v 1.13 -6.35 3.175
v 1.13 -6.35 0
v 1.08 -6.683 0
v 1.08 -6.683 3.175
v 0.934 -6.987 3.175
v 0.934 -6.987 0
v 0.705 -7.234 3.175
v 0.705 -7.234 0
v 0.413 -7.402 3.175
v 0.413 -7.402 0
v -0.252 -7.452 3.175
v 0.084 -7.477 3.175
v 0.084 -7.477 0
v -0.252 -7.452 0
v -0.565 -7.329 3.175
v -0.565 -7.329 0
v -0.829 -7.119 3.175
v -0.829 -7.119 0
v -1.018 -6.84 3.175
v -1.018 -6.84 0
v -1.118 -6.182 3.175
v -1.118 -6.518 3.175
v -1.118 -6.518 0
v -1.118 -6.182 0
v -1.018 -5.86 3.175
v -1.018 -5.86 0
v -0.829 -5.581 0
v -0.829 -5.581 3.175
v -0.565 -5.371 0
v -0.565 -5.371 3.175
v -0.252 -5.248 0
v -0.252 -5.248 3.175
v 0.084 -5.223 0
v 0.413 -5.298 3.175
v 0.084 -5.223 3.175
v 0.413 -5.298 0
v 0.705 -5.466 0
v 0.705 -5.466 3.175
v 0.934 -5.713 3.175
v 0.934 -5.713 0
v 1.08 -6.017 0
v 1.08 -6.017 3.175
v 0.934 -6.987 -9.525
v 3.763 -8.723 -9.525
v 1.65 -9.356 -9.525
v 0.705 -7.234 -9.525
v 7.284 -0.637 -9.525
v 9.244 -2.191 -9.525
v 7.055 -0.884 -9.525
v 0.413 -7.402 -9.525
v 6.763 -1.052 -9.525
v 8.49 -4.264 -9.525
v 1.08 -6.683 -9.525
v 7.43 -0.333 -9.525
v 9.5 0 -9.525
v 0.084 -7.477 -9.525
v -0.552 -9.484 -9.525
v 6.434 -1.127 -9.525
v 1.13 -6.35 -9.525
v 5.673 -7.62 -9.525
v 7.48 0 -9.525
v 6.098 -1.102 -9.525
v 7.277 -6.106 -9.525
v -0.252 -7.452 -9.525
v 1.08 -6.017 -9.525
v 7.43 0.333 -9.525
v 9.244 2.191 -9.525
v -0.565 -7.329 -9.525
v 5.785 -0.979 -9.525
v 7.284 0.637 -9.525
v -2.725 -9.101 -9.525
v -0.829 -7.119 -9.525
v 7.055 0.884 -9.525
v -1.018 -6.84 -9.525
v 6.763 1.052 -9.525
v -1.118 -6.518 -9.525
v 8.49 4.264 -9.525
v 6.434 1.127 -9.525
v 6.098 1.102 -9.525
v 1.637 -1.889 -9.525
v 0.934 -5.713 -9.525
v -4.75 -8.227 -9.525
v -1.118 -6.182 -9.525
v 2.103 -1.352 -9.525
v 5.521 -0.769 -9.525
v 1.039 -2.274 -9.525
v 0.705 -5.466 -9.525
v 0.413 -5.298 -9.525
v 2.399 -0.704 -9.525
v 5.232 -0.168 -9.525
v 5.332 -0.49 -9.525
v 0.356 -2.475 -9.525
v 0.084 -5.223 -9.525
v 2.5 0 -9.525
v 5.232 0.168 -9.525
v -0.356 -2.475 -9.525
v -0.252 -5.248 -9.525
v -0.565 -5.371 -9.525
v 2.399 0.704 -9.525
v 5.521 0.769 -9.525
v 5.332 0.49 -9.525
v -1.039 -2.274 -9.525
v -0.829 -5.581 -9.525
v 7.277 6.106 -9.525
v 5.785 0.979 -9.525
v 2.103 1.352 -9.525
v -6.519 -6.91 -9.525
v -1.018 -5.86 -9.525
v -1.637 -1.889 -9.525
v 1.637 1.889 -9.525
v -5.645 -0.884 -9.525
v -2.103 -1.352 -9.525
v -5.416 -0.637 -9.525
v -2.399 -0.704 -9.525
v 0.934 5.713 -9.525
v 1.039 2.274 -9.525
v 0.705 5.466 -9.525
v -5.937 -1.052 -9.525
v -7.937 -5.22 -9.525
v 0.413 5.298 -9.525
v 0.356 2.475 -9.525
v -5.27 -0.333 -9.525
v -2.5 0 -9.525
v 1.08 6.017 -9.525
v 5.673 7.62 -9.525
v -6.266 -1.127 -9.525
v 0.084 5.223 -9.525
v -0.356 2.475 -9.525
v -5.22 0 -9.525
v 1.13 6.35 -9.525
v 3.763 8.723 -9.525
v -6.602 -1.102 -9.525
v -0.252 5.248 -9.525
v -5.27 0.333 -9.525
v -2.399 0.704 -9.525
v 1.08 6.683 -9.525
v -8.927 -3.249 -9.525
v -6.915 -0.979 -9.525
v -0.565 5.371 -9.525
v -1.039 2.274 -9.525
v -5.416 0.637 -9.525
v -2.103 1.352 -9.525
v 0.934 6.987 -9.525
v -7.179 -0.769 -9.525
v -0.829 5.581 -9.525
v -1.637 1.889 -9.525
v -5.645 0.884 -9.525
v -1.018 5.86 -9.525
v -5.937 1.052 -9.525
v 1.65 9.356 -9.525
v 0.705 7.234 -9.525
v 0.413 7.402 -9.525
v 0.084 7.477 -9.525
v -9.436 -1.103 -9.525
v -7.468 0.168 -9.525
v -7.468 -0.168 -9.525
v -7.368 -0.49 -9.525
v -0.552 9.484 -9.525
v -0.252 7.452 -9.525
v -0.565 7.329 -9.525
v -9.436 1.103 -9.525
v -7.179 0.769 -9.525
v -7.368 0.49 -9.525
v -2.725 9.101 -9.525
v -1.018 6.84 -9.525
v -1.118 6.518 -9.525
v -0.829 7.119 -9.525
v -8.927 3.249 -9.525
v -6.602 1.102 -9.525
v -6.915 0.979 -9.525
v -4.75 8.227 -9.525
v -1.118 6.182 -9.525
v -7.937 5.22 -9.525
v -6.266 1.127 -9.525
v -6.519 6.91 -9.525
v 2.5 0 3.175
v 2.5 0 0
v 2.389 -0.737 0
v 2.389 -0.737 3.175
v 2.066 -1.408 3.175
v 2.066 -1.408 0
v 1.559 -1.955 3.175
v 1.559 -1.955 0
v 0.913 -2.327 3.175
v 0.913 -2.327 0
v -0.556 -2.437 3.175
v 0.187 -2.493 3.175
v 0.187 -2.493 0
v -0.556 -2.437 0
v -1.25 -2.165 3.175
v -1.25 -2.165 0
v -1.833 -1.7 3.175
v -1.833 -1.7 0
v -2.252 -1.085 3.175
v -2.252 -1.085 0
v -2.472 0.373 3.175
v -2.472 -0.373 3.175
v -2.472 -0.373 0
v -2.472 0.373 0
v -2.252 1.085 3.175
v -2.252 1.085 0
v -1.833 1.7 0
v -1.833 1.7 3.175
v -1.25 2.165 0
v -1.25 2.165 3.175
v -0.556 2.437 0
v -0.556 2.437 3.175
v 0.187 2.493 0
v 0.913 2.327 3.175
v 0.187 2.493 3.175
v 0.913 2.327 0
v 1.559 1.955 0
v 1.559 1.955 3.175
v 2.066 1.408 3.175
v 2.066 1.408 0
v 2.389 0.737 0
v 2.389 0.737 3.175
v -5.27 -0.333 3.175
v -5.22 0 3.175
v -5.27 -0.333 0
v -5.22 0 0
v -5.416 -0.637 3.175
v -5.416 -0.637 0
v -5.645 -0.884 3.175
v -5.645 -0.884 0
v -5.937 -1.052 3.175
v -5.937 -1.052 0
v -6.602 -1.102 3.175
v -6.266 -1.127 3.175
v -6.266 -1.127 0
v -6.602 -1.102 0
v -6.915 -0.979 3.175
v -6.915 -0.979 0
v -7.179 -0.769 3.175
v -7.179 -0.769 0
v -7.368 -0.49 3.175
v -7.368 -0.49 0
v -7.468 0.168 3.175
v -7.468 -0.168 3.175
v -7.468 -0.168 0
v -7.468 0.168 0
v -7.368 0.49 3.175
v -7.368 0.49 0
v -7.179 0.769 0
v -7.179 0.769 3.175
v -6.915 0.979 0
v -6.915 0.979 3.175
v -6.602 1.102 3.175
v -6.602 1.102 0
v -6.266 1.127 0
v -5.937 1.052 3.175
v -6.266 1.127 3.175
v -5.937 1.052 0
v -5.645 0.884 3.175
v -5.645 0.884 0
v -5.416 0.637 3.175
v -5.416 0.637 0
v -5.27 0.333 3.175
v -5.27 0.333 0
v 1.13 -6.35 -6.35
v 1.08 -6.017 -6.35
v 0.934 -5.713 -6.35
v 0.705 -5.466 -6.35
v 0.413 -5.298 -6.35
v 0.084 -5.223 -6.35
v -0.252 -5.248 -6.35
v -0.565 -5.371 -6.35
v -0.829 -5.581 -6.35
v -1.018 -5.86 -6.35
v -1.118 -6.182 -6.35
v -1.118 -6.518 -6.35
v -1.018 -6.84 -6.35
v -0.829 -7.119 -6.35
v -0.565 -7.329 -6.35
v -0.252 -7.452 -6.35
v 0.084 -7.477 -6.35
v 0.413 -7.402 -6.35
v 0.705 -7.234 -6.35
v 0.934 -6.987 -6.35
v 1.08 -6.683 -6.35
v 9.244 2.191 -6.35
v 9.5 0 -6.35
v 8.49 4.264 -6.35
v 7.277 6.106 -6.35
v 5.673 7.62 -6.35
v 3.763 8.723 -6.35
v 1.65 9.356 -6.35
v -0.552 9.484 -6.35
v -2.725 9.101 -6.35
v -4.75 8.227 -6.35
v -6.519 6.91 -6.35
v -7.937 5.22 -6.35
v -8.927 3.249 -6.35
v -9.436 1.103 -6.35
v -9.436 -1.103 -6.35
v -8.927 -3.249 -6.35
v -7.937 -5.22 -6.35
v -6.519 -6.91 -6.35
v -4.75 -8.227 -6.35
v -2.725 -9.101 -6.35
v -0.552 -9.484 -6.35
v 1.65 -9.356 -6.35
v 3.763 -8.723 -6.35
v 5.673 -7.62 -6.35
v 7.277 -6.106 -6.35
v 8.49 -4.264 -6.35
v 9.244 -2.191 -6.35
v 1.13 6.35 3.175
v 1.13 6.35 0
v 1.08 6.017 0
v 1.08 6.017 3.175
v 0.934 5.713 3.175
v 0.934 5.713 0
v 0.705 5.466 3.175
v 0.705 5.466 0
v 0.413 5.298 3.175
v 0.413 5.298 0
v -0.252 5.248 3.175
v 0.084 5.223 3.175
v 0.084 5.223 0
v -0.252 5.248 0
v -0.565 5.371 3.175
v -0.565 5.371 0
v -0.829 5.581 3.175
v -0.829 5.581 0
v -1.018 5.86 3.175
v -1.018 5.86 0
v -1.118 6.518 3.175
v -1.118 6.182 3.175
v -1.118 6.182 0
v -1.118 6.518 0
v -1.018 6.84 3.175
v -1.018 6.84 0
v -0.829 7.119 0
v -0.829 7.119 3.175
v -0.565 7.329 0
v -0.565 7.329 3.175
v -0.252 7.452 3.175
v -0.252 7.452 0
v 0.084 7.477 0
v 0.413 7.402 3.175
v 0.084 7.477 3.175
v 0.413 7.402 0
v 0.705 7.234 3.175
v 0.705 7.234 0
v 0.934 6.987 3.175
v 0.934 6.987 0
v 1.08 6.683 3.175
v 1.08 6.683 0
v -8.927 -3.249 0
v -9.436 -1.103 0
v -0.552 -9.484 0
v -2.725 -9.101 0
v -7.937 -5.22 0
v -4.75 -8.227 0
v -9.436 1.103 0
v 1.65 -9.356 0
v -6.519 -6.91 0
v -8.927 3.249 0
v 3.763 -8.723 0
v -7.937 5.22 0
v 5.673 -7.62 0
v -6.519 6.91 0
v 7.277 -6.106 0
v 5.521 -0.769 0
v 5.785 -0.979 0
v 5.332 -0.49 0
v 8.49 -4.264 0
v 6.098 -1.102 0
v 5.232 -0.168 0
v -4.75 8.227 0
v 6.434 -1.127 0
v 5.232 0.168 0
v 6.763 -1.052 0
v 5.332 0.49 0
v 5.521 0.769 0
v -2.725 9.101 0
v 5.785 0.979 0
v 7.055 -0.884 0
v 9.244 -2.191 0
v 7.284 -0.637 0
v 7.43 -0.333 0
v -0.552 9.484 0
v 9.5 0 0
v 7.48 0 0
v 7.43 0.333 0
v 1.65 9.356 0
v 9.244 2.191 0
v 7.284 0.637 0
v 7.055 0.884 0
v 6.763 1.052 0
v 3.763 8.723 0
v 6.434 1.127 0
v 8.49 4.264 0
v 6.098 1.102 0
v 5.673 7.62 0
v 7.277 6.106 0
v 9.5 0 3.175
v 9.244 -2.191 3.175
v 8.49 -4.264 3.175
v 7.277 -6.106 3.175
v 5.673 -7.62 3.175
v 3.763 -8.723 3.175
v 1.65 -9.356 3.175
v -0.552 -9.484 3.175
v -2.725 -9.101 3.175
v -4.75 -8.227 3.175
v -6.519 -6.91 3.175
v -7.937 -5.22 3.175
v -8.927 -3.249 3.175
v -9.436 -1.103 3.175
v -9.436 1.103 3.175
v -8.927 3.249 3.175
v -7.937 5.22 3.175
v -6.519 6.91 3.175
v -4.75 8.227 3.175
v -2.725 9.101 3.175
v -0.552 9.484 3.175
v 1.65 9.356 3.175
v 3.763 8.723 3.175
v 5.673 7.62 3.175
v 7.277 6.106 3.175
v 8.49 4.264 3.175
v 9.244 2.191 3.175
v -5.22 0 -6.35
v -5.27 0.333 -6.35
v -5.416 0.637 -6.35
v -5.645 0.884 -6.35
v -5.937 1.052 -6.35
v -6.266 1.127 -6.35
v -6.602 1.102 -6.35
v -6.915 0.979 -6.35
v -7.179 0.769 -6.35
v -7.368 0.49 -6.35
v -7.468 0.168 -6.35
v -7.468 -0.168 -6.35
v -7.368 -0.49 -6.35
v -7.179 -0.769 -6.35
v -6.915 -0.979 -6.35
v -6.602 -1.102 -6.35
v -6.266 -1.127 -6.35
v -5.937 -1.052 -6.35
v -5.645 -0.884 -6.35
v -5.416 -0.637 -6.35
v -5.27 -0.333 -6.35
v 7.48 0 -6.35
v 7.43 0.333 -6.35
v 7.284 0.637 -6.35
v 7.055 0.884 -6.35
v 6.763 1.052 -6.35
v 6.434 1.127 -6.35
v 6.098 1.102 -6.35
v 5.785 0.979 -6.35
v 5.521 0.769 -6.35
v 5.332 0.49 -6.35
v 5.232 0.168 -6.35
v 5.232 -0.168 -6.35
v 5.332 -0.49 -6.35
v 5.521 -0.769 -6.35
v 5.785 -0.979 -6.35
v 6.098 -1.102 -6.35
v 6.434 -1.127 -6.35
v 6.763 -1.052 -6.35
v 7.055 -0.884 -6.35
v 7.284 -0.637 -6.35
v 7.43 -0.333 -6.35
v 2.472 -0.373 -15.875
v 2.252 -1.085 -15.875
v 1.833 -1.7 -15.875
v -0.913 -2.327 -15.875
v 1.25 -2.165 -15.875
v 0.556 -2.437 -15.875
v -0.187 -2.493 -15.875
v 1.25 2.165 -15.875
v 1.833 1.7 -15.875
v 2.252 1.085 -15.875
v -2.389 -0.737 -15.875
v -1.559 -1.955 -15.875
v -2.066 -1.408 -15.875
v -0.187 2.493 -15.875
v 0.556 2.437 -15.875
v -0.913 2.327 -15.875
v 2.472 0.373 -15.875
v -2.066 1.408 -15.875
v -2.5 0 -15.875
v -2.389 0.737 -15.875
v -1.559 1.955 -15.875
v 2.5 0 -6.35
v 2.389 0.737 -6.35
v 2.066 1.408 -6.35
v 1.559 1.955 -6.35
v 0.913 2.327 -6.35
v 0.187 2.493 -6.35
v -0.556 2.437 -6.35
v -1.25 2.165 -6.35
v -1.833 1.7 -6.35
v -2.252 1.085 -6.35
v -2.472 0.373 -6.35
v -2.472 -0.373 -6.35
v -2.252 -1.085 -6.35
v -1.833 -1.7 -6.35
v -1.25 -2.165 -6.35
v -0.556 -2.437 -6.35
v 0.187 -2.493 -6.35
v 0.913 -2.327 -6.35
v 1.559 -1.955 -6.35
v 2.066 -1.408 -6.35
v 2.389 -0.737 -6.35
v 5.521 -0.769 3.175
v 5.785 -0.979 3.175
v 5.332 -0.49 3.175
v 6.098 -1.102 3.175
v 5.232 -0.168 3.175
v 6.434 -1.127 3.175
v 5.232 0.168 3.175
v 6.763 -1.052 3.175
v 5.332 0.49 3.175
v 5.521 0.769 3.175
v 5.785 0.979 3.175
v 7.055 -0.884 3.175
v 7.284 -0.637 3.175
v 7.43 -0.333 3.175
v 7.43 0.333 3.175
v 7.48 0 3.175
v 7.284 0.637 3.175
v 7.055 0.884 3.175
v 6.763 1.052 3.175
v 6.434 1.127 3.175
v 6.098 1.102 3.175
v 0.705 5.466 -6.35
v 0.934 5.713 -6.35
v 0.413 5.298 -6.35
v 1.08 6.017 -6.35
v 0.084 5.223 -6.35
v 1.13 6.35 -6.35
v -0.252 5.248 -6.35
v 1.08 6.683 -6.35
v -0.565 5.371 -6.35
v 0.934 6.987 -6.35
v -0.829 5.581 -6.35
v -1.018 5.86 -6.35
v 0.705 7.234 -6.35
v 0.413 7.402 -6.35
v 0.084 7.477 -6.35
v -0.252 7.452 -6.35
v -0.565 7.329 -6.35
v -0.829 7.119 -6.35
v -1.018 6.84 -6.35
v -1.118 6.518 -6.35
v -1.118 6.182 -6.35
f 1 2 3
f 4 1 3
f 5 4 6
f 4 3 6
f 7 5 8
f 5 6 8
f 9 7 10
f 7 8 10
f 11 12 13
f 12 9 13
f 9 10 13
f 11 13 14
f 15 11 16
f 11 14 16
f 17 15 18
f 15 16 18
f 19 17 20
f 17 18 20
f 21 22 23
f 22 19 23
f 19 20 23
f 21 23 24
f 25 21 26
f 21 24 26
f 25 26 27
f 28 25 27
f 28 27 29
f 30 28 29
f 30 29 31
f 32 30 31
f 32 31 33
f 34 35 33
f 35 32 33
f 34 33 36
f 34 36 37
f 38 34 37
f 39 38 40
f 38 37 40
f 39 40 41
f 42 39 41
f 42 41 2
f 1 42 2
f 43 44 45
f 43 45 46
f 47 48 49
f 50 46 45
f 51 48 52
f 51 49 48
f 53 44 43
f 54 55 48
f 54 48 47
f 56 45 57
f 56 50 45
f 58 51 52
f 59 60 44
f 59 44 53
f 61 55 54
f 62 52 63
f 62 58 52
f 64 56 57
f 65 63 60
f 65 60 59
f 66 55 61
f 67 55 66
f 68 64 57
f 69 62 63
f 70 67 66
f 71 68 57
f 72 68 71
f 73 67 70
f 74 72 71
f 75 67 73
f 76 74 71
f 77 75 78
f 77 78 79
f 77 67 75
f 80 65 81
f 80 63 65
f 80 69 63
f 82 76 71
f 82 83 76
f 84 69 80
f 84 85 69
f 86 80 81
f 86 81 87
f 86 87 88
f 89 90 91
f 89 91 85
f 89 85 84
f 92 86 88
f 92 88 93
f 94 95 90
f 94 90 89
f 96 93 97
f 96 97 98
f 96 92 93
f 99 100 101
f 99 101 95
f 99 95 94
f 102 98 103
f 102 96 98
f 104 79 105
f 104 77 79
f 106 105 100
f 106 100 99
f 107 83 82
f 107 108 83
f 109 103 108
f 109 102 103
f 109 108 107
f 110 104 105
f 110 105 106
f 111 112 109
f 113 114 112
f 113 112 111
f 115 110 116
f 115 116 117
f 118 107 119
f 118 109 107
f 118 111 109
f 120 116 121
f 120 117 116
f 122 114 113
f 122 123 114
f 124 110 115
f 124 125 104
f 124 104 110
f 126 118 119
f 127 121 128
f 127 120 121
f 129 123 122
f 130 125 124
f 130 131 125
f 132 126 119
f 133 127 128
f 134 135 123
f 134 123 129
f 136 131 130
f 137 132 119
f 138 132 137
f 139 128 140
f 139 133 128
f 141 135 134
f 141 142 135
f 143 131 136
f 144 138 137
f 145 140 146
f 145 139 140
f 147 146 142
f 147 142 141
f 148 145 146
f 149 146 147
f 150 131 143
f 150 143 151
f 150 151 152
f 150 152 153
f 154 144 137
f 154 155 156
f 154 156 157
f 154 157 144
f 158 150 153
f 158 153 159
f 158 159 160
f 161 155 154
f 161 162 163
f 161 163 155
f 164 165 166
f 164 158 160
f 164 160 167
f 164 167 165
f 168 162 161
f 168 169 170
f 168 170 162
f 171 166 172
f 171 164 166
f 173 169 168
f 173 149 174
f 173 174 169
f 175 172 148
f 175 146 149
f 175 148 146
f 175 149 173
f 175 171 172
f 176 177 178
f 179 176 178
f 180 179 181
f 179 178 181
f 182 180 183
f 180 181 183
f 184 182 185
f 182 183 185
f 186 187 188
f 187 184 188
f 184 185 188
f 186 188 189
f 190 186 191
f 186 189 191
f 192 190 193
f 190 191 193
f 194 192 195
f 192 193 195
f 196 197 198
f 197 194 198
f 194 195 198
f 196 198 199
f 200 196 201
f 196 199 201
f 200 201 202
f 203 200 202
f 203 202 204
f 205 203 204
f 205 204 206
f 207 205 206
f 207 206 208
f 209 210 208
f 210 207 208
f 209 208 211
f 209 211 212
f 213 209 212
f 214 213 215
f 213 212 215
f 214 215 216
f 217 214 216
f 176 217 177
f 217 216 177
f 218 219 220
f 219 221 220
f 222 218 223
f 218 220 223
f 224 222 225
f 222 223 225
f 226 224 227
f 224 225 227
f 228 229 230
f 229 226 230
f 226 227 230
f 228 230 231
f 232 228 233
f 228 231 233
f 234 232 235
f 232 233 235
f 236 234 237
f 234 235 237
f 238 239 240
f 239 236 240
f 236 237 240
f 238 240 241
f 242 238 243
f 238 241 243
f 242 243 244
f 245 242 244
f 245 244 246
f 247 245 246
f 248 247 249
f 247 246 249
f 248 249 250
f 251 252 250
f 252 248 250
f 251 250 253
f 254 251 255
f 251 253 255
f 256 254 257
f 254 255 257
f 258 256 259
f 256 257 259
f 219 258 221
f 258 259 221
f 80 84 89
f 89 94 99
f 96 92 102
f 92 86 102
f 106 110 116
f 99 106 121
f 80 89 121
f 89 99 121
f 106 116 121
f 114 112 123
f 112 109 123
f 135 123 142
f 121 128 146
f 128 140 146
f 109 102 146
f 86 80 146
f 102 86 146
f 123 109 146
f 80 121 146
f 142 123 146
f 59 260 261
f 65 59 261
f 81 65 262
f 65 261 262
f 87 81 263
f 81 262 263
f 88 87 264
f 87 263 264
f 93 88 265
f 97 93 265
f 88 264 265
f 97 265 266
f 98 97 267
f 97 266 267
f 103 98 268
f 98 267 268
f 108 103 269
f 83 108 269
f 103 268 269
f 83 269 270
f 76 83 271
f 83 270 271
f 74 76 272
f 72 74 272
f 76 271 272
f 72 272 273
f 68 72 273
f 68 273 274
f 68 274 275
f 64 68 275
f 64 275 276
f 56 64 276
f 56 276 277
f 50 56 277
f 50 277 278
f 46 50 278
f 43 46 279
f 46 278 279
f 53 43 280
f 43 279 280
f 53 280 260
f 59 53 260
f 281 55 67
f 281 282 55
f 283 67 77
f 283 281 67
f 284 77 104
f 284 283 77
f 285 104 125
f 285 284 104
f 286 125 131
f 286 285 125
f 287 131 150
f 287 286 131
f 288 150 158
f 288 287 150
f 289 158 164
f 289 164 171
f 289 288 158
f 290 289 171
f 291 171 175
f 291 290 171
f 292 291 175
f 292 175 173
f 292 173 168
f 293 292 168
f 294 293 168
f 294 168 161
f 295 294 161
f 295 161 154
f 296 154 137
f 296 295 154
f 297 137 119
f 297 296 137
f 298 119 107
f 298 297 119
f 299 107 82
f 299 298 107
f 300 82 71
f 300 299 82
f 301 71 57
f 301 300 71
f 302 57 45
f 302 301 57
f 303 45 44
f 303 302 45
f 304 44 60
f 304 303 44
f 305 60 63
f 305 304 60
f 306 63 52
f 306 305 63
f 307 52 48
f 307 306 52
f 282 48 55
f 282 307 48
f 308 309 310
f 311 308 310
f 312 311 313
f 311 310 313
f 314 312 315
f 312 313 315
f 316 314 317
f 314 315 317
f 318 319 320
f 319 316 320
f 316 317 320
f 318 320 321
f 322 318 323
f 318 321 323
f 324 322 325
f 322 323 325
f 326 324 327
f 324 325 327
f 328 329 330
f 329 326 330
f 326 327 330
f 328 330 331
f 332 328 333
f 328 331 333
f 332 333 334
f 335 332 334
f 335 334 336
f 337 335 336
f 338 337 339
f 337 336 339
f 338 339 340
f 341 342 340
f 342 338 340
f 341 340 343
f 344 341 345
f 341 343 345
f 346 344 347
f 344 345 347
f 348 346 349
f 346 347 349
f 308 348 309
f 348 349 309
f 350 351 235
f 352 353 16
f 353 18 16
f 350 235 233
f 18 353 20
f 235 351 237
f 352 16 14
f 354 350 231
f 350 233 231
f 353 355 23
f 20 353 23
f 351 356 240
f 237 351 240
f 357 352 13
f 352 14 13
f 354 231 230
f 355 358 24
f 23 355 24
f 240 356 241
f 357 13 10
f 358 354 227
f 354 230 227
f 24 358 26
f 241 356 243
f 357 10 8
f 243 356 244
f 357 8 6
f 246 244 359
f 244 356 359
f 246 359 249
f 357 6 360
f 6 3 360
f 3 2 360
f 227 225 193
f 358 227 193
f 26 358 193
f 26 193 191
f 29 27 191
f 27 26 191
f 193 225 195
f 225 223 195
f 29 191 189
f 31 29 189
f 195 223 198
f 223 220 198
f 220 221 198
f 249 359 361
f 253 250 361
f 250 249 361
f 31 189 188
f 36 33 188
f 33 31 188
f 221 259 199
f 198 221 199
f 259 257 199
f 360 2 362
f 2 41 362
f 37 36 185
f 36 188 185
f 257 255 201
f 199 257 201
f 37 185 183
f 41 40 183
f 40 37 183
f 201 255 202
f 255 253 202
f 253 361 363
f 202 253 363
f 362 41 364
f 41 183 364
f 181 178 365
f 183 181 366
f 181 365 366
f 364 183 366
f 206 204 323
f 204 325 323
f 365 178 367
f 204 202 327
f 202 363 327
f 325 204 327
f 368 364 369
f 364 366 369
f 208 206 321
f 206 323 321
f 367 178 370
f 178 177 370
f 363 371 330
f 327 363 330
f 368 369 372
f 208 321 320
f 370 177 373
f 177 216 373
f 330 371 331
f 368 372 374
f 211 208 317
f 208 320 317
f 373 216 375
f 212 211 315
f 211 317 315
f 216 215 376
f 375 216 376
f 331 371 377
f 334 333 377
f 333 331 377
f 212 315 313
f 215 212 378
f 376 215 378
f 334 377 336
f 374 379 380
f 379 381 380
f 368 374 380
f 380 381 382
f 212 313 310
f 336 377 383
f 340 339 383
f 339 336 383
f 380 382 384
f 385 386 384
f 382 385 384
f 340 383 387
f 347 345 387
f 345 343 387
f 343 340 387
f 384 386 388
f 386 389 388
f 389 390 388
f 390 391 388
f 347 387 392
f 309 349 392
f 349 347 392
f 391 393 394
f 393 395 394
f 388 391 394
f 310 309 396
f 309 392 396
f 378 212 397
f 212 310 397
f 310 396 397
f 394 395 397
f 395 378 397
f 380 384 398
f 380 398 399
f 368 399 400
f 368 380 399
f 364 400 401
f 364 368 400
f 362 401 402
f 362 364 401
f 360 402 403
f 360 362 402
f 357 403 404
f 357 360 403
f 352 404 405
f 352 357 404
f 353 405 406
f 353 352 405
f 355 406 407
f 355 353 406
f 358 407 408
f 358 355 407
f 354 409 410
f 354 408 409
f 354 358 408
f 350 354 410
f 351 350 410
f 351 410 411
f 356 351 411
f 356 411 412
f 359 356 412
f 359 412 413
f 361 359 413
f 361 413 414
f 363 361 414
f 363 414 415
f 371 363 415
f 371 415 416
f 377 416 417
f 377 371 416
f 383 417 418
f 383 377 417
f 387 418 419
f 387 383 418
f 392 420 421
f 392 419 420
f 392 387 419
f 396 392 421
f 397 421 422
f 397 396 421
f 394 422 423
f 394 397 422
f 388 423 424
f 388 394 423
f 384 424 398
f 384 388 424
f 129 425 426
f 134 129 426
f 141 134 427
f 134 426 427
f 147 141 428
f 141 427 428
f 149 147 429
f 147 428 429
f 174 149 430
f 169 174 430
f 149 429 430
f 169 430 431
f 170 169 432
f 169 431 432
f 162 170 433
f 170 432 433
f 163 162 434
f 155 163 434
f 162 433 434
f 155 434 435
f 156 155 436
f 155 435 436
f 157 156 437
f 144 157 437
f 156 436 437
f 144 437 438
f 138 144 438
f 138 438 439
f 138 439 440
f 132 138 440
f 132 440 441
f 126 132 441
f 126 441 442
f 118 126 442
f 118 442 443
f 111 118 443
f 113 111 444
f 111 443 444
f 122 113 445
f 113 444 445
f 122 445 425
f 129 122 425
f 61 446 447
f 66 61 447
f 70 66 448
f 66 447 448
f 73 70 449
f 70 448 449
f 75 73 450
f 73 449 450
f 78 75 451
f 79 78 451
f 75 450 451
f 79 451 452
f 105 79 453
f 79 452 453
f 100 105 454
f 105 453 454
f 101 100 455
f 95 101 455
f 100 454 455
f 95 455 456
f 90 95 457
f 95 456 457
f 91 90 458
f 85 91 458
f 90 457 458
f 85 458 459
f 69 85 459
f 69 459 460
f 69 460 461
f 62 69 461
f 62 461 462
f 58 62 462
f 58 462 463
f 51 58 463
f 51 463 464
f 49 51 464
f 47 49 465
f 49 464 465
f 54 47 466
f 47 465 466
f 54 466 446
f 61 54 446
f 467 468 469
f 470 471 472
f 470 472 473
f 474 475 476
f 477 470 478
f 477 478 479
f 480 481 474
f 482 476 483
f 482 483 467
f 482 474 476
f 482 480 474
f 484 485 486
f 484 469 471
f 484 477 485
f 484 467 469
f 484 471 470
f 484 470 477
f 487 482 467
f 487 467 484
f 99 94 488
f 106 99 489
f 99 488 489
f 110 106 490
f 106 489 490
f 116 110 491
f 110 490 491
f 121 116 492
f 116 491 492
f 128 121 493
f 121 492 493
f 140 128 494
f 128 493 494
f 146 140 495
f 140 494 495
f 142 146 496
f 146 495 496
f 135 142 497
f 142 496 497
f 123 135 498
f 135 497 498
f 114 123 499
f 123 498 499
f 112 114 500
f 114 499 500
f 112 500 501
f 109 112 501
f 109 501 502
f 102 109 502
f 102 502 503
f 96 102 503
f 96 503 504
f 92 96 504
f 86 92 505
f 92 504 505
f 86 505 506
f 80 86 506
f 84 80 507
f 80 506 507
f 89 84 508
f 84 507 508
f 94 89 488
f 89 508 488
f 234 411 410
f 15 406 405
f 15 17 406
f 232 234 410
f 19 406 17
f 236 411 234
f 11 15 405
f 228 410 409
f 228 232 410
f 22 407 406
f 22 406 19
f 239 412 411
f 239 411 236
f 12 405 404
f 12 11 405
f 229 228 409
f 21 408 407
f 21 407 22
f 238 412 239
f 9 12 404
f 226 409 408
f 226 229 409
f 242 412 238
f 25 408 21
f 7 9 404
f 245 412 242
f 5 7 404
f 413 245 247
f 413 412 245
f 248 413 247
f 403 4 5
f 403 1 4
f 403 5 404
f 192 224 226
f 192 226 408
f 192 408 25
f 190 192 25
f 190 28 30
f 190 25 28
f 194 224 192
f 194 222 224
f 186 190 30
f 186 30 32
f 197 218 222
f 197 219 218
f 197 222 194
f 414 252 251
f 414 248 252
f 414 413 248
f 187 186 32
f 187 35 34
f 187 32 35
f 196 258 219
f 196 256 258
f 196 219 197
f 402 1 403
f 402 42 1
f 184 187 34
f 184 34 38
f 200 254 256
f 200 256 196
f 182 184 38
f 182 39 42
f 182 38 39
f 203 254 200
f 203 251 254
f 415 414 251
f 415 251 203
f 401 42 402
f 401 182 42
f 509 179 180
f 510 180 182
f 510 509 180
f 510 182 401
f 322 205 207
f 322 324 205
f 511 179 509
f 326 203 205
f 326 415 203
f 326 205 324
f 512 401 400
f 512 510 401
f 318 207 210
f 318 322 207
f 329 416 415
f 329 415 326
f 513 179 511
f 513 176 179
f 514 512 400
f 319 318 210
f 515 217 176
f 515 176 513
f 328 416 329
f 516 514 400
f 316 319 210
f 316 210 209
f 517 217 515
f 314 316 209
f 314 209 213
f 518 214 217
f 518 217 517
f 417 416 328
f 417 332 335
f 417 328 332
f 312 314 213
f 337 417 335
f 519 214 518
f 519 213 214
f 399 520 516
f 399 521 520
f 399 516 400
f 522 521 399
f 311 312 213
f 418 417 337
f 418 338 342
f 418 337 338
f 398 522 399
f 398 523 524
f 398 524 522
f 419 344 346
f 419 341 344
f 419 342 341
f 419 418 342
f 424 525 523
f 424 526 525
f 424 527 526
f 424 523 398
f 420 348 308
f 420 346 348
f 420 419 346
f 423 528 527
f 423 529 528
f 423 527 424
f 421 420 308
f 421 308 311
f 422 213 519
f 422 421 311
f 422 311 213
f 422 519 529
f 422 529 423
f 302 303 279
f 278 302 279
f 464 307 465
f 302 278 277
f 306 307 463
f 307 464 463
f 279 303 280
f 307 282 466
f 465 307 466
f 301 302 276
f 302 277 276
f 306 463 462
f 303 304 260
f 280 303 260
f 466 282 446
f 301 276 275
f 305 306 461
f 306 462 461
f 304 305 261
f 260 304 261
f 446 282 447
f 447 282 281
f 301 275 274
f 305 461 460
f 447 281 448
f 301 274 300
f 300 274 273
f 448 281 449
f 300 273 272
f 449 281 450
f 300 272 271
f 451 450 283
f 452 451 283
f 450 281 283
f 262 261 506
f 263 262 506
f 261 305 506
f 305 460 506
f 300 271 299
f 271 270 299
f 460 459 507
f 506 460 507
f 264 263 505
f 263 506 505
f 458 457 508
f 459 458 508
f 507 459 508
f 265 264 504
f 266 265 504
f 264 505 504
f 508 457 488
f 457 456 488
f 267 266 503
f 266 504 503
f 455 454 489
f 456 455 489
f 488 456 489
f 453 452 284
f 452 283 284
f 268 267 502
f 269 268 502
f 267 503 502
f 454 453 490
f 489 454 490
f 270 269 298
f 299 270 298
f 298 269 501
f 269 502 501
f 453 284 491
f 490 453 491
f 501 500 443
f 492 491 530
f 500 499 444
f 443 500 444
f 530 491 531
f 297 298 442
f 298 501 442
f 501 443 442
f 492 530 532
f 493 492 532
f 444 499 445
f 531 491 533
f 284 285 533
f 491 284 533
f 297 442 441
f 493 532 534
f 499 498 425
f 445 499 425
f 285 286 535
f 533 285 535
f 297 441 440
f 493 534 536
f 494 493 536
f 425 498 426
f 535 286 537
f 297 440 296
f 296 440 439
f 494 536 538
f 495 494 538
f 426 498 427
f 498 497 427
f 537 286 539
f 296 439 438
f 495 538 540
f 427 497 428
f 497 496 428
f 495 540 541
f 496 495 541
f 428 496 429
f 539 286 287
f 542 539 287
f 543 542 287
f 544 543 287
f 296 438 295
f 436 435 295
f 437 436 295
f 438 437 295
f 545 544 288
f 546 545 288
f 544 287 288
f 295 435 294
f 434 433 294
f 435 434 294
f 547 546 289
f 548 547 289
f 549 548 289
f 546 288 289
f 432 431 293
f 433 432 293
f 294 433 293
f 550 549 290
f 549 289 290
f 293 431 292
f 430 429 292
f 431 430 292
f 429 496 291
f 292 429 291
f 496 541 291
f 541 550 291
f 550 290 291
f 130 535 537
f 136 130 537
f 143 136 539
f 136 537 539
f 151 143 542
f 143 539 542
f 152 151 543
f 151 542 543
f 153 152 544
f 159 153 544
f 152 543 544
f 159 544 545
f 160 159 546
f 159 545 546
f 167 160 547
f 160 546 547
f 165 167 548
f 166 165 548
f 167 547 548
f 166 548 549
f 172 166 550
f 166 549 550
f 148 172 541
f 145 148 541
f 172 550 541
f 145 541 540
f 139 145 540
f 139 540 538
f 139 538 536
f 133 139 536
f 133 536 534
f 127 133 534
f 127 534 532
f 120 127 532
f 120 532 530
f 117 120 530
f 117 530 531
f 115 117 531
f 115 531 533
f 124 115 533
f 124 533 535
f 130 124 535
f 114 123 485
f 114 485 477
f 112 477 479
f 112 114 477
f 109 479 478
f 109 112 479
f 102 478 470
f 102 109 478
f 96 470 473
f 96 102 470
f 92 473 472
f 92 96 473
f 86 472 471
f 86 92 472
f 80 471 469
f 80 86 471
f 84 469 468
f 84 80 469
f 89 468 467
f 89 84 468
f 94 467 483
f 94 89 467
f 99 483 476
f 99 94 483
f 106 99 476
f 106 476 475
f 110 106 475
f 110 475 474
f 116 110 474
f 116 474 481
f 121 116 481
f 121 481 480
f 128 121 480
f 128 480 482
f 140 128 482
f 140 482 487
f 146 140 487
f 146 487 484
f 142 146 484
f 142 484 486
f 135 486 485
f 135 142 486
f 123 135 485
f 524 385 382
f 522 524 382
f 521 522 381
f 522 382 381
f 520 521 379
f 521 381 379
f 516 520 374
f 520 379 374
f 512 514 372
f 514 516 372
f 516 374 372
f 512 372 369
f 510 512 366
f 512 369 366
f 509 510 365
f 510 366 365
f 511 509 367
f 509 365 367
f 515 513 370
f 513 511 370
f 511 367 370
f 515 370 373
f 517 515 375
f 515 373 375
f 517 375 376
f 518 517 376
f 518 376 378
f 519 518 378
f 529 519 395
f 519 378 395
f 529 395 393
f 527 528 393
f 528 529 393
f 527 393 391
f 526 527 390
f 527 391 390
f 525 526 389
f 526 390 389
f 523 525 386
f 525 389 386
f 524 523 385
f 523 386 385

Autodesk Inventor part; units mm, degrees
ref_plane "YZ Plane" through (0, 0, 0) normal (1, 0, 0) x (0, 1, 0)
ref_plane "XZ Plane" through (0, 0, 0) normal (0, 1, 0) x (-1, 0, 0)
ref_plane "XY Plane" through (0, 0, 0) normal (0, 0, 1) x (1, 0, 0)
sketch "Sketch1" plane through (0, 0, 0) normal (0, 0, 1) x (1, 0, 0)
  circle A0 centre (0, 0) radius 9.5
  circle A1 centre (0, 0) radius 2.5
  circle A2 centre (-6.35, 0) radius 1.1303
  circle A3 centre (0, 6.35) radius 1.1303
  circle A4 centre (6.35, 0) radius 1.1303
  circle A5 centre (0, -6.35) radius 1.1303
  dimension "d0" = 19
  dimension "d1" = 5
  dimension "d2" = 6.35
  dimension "d3" = 2.2606
  dimension "d4" = 6.35
  dimension "d5" = 6.35
  dimension "d6" = 6.35
  dimension "d7" = 2.2606
  dimension "d8" = 2.2606
  dimension "d9" = 2.2606
extrude "Extrusion1" add sketch "Sketch1" along normal blind 3.175
ref_plane "Work Plane1" through (0, 0, -3.175) normal (0, 0, -1) x (-1, 0, 0)
mirror "Mirror1" about plane through (0, 0, -3.175) normal (0, 0, -1) of "Extrusion1"
sketch "Sketch2" plane through (0, 0, -9.525) normal (0, 0, -1) x (-1, 0, 0)
  circle A0 centre (0, 0) radius 2.5
extrude "Extrusion2" add sketch "Sketch2" along normal blind 6.35
